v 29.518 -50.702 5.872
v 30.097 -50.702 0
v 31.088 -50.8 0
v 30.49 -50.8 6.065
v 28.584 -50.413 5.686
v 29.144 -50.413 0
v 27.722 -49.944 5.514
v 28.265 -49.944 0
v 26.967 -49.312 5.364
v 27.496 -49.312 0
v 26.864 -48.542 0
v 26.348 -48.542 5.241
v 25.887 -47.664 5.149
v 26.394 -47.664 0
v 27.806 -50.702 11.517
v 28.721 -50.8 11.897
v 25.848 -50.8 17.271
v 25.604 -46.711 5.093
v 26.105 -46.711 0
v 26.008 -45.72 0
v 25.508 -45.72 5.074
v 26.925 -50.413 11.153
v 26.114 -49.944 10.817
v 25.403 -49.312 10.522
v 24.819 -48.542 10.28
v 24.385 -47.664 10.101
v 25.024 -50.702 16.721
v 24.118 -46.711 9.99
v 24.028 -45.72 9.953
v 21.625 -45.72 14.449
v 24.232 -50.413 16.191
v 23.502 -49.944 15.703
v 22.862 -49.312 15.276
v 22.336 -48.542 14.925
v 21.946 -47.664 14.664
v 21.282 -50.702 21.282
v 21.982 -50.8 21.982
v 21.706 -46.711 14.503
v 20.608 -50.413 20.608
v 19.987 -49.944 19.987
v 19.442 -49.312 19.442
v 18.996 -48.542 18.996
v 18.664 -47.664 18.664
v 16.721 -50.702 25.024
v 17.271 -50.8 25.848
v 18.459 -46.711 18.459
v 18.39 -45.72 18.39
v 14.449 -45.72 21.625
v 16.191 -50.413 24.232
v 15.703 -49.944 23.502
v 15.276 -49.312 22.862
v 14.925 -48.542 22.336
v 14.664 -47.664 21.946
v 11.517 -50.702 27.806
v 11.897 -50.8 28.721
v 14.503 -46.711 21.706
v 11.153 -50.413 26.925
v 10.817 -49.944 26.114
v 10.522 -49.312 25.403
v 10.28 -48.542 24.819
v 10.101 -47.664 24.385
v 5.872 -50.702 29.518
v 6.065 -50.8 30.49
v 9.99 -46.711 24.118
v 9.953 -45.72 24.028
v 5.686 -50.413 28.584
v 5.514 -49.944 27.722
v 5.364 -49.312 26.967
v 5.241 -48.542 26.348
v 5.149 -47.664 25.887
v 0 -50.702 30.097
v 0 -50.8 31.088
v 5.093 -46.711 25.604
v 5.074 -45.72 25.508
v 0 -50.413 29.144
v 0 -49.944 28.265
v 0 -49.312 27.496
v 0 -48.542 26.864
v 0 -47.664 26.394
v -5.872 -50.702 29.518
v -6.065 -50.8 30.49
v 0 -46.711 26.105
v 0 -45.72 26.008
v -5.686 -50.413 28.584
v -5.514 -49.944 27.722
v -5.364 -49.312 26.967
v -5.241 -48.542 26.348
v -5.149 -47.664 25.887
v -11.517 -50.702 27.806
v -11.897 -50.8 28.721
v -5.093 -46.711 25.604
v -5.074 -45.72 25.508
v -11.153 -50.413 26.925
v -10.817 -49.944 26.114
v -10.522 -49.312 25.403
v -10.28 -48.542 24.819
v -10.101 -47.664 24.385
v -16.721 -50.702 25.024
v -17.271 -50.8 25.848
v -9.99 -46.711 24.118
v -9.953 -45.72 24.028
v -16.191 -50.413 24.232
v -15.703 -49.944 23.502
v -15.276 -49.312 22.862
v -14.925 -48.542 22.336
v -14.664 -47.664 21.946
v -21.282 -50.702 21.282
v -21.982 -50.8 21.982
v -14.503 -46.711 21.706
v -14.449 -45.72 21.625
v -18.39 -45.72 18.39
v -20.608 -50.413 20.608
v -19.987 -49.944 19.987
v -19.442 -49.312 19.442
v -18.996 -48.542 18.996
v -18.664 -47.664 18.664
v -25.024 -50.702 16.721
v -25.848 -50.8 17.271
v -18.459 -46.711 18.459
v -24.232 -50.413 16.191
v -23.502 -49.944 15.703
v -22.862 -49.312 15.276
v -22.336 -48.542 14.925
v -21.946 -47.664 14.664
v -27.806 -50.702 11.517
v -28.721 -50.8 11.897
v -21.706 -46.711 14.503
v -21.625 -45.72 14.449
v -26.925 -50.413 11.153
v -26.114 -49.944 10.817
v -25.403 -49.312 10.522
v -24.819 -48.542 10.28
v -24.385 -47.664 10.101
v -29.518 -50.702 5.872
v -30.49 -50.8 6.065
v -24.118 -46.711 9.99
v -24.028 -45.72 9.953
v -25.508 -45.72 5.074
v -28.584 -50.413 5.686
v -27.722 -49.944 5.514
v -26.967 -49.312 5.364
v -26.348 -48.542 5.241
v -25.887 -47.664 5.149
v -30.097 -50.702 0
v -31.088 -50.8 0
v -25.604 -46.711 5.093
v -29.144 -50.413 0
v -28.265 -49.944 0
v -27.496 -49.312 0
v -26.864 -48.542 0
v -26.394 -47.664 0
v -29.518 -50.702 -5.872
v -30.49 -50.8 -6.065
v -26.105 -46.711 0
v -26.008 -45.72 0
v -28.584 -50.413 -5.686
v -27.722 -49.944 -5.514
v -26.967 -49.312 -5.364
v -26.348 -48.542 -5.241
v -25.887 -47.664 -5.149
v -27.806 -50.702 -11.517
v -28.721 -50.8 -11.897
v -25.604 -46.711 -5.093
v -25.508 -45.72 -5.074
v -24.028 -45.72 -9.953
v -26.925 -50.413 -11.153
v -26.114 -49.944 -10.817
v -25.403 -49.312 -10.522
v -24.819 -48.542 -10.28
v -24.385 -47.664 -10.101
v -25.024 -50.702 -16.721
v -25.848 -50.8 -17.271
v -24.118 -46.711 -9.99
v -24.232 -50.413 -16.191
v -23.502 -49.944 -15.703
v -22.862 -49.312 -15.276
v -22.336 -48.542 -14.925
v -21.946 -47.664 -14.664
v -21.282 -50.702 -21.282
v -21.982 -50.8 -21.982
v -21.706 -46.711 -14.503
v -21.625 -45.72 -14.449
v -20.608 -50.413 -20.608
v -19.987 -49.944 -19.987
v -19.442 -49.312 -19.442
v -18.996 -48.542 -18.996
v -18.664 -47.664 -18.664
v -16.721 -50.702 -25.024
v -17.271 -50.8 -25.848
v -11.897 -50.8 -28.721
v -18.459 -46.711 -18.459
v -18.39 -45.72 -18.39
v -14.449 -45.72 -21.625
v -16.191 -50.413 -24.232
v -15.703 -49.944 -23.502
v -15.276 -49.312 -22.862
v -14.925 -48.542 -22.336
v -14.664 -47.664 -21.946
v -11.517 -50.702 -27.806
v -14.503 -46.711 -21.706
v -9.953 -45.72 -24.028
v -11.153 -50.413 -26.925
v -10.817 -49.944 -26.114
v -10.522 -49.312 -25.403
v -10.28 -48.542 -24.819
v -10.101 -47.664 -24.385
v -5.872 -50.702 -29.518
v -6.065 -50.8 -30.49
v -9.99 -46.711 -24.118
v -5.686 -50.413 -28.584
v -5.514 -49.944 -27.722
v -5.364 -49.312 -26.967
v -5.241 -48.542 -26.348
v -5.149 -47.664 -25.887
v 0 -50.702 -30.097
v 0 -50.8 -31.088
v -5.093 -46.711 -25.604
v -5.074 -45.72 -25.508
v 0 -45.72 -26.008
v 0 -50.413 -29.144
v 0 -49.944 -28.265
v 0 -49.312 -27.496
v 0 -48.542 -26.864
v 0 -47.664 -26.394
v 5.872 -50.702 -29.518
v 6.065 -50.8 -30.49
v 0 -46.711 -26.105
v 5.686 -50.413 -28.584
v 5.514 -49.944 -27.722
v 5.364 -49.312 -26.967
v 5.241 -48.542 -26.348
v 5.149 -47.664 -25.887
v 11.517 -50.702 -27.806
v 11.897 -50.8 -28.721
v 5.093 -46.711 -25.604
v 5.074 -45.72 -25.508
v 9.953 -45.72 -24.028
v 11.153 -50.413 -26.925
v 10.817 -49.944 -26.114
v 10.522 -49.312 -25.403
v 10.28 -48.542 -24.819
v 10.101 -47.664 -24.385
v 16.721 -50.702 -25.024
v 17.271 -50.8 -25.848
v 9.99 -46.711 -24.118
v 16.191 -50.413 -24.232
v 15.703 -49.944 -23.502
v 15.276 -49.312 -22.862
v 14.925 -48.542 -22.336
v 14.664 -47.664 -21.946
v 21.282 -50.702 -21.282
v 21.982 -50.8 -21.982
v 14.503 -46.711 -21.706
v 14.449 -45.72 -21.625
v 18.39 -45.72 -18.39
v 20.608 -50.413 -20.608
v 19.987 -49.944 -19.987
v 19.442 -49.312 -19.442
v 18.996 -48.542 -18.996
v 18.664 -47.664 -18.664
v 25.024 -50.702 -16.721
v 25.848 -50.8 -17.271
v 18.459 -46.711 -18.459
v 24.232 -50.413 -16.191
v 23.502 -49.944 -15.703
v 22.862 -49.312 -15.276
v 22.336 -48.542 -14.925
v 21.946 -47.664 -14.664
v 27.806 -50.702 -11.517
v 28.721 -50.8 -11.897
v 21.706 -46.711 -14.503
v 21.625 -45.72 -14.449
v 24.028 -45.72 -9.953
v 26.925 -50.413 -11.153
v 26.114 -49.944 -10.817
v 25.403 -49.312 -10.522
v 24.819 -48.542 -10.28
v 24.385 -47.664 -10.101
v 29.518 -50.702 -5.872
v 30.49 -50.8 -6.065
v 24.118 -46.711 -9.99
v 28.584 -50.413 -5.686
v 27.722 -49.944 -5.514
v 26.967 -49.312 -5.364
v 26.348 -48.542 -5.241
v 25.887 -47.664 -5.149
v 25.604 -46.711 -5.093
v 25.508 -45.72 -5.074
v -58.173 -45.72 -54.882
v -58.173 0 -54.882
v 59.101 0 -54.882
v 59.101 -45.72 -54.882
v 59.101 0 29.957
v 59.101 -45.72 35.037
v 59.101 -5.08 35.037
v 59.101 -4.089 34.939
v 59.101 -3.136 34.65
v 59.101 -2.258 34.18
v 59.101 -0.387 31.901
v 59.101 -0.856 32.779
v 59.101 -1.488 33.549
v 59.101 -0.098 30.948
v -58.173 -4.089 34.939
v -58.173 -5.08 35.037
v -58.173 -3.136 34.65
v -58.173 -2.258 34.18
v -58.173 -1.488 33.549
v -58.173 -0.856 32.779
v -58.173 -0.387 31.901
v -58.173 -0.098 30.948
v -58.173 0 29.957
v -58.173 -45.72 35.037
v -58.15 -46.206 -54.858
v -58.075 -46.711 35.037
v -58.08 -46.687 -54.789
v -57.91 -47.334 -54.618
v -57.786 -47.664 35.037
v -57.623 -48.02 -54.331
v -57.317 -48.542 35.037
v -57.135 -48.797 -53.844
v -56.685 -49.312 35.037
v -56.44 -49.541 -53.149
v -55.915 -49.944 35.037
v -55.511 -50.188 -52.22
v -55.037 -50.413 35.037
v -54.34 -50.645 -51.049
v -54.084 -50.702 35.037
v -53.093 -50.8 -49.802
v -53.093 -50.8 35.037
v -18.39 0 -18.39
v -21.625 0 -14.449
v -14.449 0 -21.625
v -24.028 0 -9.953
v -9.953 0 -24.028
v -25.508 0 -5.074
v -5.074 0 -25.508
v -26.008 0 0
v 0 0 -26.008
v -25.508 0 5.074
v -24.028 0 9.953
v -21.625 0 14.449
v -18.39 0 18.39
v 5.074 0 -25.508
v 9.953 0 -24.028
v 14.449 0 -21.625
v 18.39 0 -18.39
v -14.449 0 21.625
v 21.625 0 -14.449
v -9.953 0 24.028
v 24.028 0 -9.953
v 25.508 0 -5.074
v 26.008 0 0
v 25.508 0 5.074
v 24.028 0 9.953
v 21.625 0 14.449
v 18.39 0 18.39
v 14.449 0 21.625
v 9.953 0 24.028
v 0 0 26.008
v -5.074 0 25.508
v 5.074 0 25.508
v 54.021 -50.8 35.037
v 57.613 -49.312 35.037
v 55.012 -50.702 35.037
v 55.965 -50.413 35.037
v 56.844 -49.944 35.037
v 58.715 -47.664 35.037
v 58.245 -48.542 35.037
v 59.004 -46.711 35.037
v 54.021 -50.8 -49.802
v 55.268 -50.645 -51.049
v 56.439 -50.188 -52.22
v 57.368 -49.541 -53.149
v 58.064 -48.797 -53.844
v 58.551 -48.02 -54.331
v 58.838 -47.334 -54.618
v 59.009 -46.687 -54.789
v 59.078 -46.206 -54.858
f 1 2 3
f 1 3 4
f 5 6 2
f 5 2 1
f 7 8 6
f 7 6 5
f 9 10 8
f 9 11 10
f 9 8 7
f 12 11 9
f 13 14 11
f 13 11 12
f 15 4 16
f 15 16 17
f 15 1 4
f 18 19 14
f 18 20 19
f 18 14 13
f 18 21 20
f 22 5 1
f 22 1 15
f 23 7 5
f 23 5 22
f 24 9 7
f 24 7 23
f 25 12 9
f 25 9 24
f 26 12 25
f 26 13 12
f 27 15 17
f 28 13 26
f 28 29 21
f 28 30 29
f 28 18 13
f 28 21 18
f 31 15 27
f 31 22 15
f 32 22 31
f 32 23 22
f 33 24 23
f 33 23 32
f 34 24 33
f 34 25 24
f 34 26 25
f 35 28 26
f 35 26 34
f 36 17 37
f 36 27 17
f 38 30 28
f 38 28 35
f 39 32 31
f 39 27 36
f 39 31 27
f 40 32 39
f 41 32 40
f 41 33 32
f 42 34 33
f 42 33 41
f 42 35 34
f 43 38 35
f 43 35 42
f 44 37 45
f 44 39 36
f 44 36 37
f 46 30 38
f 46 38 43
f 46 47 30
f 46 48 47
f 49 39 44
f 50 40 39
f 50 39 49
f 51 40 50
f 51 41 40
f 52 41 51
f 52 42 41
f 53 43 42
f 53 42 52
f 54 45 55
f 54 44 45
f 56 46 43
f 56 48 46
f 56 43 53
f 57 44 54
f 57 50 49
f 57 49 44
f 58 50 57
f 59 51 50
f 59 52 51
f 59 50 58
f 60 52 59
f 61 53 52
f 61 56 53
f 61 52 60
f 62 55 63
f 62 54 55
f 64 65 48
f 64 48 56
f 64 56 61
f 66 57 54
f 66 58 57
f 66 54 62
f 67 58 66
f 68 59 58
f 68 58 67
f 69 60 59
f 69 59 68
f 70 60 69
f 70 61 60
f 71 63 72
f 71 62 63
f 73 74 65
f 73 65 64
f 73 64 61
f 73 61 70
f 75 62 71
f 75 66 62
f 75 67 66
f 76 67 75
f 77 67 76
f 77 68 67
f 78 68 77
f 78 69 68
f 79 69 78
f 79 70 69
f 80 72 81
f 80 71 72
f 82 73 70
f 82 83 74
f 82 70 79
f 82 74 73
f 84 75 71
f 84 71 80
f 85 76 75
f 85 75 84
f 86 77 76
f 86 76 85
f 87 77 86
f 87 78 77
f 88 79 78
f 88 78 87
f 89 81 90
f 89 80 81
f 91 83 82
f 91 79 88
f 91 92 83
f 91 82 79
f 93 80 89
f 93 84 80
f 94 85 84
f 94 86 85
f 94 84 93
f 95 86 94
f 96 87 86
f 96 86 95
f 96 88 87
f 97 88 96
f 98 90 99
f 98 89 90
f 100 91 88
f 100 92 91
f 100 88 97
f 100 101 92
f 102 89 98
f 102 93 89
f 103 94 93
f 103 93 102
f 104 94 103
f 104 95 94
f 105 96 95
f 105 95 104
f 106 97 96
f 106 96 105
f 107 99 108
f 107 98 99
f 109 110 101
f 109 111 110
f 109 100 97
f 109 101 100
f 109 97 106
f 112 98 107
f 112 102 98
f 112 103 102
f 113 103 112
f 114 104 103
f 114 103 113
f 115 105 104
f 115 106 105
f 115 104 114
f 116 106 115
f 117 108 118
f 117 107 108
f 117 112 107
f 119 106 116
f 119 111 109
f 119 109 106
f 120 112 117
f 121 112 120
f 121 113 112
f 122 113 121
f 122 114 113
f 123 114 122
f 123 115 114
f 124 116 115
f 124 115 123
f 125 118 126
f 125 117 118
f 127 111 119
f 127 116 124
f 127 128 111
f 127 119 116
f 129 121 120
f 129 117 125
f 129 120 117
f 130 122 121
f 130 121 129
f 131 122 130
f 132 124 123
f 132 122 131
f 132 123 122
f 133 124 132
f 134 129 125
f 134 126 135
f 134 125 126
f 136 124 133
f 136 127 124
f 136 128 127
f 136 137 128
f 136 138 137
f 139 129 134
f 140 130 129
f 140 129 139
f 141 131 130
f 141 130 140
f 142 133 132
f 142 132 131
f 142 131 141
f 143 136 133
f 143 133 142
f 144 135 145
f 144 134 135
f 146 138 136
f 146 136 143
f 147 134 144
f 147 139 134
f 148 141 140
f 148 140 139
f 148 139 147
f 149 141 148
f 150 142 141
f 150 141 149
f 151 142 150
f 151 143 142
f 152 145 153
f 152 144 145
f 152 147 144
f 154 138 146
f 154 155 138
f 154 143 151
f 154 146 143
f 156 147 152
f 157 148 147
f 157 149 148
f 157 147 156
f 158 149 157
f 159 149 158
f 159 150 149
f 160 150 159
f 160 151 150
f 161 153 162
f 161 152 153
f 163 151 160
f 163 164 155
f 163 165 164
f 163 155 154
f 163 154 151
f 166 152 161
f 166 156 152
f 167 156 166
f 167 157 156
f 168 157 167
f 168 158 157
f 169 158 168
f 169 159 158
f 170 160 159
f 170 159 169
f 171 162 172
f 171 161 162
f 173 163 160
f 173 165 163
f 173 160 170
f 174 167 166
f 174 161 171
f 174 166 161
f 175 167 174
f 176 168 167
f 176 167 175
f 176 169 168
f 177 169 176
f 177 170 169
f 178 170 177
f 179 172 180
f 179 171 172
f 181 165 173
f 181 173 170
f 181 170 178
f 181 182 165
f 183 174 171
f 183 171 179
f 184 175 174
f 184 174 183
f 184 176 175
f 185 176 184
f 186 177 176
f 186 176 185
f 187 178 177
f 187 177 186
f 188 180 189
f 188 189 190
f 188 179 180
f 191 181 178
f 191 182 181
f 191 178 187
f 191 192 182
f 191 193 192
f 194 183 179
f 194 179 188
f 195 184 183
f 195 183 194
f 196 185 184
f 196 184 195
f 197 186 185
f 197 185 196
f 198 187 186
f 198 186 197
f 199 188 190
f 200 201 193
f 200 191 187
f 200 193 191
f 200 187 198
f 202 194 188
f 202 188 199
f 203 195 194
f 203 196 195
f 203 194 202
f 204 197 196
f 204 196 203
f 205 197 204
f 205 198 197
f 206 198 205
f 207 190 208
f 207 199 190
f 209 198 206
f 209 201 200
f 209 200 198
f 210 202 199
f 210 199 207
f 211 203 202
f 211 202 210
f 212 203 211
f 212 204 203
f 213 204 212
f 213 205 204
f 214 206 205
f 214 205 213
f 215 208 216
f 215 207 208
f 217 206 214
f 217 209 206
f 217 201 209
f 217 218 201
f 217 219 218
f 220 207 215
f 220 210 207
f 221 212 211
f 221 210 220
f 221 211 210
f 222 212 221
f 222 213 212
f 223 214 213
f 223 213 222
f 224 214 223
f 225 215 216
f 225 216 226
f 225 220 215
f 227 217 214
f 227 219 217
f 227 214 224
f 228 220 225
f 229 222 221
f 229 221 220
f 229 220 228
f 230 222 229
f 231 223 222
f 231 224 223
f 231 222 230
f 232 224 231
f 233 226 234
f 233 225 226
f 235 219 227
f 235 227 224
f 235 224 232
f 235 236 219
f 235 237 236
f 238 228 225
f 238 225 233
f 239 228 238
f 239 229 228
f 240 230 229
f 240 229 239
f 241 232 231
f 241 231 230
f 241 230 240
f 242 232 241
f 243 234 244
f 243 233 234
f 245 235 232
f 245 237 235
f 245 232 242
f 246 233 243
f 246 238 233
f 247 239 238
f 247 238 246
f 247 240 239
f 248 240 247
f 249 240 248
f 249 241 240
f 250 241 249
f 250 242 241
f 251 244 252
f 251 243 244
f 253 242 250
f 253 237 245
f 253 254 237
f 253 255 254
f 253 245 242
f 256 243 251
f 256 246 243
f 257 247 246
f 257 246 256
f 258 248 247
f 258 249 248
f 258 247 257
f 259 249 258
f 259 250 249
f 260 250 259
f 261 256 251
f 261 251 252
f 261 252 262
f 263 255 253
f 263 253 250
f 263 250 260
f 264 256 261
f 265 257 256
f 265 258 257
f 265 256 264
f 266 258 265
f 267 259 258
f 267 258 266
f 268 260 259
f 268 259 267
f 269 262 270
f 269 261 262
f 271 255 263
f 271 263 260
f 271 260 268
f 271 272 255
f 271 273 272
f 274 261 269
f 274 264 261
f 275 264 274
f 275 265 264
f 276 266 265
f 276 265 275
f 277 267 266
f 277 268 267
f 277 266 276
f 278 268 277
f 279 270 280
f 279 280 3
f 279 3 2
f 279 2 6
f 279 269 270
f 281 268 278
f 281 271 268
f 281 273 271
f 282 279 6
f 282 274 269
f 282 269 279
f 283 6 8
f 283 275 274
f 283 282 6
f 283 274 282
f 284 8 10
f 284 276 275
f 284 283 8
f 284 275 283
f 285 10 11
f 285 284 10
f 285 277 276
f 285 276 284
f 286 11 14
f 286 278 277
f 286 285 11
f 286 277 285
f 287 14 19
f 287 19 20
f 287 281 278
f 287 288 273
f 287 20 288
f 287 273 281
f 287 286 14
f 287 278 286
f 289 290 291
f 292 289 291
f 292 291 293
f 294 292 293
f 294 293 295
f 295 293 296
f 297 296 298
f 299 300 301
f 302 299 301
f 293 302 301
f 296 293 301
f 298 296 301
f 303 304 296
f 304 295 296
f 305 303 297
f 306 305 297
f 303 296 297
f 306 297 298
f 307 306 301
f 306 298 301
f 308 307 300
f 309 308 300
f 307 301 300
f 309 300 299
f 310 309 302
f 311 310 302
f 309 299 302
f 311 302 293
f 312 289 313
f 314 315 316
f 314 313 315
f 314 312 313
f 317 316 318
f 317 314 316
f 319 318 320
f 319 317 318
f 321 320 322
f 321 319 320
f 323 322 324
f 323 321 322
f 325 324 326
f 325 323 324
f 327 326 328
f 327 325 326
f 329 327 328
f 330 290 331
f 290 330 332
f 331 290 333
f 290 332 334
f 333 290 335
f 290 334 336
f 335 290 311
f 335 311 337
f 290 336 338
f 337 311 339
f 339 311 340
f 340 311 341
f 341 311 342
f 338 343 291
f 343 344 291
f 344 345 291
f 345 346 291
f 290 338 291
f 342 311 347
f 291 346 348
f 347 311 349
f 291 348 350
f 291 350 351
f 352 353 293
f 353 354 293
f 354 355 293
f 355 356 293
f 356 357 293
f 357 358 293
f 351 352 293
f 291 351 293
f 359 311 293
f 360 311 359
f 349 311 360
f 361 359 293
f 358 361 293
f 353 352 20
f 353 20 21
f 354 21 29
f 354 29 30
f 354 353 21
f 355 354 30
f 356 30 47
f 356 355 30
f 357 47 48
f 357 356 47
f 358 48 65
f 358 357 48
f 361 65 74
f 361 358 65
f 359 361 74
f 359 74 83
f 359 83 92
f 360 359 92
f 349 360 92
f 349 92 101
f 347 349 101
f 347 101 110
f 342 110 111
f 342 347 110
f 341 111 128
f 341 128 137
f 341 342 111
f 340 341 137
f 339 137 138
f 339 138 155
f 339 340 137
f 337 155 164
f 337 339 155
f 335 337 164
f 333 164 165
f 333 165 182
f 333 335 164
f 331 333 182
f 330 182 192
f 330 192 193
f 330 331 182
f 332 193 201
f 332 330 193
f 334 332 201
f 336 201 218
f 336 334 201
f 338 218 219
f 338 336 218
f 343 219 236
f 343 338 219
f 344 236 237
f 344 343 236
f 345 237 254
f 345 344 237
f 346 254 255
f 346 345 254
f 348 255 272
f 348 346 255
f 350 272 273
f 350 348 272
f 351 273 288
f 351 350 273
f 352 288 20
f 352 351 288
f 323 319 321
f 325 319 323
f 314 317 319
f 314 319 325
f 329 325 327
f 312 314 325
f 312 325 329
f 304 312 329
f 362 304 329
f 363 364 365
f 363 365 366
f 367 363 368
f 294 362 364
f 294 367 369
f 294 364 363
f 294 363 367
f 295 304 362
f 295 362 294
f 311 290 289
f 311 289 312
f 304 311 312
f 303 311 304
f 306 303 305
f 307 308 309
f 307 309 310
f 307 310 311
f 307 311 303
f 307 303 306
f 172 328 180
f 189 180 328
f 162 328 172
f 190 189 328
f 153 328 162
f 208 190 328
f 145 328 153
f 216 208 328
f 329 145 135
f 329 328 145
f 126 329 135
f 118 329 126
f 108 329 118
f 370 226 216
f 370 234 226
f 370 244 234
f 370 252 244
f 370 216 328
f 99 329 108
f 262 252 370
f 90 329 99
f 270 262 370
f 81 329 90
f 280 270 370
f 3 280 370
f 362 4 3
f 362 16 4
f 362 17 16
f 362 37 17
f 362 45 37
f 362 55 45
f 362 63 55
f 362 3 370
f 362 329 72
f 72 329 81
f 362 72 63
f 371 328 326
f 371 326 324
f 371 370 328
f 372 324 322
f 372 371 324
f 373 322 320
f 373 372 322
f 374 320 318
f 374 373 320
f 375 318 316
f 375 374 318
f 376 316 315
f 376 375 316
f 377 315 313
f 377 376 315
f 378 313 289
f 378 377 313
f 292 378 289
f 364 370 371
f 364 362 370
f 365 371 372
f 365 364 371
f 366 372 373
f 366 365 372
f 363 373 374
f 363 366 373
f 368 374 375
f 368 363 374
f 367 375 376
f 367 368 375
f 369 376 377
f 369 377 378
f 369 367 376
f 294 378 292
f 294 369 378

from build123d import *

# Parameters (mm, degrees)
F0_W     = 117.274408
F0_H     = 89.918245
F0_R     = 26.007652
F1_DEPTH = 50.8
F2_R     = 5.08
F3_R     = 5.08
F4_R     = 5.08


with BuildPart() as f1:
    # F0 (on Front) → F1 (new body)
    with BuildSketch(Plane.XZ):
        with Locations((0.464147, -9.922528)):
            Rectangle(F0_W, F0_H)
        Circle(F0_R, mode=Mode.SUBTRACT)
    extrude(amount=F1_DEPTH)

    # F2
    f2_edges = [f1.edges().sort_by_distance(p)[0] for p in [
        (0.464147, 0, 35.036594),
    ]]
    fillet(f2_edges, radius=F2_R)

    # F3
    f3_edges = [f1.edges().sort_by_distance(p)[0] for p in [
        (0.464147, -50.8, -54.881651),
        (-58.173057, -50.8, -9.922529),
        (59.101351, -50.8, -9.922529),
    ]]
    fillet(f3_edges, radius=F3_R)

    # F4
    f4_edges = [f1.edges().sort_by_distance(p)[0] for p in [
        (-26.007652, -50.8, 0),
    ]]
    fillet(f4_edges, radius=F4_R)


solid = f1.part
